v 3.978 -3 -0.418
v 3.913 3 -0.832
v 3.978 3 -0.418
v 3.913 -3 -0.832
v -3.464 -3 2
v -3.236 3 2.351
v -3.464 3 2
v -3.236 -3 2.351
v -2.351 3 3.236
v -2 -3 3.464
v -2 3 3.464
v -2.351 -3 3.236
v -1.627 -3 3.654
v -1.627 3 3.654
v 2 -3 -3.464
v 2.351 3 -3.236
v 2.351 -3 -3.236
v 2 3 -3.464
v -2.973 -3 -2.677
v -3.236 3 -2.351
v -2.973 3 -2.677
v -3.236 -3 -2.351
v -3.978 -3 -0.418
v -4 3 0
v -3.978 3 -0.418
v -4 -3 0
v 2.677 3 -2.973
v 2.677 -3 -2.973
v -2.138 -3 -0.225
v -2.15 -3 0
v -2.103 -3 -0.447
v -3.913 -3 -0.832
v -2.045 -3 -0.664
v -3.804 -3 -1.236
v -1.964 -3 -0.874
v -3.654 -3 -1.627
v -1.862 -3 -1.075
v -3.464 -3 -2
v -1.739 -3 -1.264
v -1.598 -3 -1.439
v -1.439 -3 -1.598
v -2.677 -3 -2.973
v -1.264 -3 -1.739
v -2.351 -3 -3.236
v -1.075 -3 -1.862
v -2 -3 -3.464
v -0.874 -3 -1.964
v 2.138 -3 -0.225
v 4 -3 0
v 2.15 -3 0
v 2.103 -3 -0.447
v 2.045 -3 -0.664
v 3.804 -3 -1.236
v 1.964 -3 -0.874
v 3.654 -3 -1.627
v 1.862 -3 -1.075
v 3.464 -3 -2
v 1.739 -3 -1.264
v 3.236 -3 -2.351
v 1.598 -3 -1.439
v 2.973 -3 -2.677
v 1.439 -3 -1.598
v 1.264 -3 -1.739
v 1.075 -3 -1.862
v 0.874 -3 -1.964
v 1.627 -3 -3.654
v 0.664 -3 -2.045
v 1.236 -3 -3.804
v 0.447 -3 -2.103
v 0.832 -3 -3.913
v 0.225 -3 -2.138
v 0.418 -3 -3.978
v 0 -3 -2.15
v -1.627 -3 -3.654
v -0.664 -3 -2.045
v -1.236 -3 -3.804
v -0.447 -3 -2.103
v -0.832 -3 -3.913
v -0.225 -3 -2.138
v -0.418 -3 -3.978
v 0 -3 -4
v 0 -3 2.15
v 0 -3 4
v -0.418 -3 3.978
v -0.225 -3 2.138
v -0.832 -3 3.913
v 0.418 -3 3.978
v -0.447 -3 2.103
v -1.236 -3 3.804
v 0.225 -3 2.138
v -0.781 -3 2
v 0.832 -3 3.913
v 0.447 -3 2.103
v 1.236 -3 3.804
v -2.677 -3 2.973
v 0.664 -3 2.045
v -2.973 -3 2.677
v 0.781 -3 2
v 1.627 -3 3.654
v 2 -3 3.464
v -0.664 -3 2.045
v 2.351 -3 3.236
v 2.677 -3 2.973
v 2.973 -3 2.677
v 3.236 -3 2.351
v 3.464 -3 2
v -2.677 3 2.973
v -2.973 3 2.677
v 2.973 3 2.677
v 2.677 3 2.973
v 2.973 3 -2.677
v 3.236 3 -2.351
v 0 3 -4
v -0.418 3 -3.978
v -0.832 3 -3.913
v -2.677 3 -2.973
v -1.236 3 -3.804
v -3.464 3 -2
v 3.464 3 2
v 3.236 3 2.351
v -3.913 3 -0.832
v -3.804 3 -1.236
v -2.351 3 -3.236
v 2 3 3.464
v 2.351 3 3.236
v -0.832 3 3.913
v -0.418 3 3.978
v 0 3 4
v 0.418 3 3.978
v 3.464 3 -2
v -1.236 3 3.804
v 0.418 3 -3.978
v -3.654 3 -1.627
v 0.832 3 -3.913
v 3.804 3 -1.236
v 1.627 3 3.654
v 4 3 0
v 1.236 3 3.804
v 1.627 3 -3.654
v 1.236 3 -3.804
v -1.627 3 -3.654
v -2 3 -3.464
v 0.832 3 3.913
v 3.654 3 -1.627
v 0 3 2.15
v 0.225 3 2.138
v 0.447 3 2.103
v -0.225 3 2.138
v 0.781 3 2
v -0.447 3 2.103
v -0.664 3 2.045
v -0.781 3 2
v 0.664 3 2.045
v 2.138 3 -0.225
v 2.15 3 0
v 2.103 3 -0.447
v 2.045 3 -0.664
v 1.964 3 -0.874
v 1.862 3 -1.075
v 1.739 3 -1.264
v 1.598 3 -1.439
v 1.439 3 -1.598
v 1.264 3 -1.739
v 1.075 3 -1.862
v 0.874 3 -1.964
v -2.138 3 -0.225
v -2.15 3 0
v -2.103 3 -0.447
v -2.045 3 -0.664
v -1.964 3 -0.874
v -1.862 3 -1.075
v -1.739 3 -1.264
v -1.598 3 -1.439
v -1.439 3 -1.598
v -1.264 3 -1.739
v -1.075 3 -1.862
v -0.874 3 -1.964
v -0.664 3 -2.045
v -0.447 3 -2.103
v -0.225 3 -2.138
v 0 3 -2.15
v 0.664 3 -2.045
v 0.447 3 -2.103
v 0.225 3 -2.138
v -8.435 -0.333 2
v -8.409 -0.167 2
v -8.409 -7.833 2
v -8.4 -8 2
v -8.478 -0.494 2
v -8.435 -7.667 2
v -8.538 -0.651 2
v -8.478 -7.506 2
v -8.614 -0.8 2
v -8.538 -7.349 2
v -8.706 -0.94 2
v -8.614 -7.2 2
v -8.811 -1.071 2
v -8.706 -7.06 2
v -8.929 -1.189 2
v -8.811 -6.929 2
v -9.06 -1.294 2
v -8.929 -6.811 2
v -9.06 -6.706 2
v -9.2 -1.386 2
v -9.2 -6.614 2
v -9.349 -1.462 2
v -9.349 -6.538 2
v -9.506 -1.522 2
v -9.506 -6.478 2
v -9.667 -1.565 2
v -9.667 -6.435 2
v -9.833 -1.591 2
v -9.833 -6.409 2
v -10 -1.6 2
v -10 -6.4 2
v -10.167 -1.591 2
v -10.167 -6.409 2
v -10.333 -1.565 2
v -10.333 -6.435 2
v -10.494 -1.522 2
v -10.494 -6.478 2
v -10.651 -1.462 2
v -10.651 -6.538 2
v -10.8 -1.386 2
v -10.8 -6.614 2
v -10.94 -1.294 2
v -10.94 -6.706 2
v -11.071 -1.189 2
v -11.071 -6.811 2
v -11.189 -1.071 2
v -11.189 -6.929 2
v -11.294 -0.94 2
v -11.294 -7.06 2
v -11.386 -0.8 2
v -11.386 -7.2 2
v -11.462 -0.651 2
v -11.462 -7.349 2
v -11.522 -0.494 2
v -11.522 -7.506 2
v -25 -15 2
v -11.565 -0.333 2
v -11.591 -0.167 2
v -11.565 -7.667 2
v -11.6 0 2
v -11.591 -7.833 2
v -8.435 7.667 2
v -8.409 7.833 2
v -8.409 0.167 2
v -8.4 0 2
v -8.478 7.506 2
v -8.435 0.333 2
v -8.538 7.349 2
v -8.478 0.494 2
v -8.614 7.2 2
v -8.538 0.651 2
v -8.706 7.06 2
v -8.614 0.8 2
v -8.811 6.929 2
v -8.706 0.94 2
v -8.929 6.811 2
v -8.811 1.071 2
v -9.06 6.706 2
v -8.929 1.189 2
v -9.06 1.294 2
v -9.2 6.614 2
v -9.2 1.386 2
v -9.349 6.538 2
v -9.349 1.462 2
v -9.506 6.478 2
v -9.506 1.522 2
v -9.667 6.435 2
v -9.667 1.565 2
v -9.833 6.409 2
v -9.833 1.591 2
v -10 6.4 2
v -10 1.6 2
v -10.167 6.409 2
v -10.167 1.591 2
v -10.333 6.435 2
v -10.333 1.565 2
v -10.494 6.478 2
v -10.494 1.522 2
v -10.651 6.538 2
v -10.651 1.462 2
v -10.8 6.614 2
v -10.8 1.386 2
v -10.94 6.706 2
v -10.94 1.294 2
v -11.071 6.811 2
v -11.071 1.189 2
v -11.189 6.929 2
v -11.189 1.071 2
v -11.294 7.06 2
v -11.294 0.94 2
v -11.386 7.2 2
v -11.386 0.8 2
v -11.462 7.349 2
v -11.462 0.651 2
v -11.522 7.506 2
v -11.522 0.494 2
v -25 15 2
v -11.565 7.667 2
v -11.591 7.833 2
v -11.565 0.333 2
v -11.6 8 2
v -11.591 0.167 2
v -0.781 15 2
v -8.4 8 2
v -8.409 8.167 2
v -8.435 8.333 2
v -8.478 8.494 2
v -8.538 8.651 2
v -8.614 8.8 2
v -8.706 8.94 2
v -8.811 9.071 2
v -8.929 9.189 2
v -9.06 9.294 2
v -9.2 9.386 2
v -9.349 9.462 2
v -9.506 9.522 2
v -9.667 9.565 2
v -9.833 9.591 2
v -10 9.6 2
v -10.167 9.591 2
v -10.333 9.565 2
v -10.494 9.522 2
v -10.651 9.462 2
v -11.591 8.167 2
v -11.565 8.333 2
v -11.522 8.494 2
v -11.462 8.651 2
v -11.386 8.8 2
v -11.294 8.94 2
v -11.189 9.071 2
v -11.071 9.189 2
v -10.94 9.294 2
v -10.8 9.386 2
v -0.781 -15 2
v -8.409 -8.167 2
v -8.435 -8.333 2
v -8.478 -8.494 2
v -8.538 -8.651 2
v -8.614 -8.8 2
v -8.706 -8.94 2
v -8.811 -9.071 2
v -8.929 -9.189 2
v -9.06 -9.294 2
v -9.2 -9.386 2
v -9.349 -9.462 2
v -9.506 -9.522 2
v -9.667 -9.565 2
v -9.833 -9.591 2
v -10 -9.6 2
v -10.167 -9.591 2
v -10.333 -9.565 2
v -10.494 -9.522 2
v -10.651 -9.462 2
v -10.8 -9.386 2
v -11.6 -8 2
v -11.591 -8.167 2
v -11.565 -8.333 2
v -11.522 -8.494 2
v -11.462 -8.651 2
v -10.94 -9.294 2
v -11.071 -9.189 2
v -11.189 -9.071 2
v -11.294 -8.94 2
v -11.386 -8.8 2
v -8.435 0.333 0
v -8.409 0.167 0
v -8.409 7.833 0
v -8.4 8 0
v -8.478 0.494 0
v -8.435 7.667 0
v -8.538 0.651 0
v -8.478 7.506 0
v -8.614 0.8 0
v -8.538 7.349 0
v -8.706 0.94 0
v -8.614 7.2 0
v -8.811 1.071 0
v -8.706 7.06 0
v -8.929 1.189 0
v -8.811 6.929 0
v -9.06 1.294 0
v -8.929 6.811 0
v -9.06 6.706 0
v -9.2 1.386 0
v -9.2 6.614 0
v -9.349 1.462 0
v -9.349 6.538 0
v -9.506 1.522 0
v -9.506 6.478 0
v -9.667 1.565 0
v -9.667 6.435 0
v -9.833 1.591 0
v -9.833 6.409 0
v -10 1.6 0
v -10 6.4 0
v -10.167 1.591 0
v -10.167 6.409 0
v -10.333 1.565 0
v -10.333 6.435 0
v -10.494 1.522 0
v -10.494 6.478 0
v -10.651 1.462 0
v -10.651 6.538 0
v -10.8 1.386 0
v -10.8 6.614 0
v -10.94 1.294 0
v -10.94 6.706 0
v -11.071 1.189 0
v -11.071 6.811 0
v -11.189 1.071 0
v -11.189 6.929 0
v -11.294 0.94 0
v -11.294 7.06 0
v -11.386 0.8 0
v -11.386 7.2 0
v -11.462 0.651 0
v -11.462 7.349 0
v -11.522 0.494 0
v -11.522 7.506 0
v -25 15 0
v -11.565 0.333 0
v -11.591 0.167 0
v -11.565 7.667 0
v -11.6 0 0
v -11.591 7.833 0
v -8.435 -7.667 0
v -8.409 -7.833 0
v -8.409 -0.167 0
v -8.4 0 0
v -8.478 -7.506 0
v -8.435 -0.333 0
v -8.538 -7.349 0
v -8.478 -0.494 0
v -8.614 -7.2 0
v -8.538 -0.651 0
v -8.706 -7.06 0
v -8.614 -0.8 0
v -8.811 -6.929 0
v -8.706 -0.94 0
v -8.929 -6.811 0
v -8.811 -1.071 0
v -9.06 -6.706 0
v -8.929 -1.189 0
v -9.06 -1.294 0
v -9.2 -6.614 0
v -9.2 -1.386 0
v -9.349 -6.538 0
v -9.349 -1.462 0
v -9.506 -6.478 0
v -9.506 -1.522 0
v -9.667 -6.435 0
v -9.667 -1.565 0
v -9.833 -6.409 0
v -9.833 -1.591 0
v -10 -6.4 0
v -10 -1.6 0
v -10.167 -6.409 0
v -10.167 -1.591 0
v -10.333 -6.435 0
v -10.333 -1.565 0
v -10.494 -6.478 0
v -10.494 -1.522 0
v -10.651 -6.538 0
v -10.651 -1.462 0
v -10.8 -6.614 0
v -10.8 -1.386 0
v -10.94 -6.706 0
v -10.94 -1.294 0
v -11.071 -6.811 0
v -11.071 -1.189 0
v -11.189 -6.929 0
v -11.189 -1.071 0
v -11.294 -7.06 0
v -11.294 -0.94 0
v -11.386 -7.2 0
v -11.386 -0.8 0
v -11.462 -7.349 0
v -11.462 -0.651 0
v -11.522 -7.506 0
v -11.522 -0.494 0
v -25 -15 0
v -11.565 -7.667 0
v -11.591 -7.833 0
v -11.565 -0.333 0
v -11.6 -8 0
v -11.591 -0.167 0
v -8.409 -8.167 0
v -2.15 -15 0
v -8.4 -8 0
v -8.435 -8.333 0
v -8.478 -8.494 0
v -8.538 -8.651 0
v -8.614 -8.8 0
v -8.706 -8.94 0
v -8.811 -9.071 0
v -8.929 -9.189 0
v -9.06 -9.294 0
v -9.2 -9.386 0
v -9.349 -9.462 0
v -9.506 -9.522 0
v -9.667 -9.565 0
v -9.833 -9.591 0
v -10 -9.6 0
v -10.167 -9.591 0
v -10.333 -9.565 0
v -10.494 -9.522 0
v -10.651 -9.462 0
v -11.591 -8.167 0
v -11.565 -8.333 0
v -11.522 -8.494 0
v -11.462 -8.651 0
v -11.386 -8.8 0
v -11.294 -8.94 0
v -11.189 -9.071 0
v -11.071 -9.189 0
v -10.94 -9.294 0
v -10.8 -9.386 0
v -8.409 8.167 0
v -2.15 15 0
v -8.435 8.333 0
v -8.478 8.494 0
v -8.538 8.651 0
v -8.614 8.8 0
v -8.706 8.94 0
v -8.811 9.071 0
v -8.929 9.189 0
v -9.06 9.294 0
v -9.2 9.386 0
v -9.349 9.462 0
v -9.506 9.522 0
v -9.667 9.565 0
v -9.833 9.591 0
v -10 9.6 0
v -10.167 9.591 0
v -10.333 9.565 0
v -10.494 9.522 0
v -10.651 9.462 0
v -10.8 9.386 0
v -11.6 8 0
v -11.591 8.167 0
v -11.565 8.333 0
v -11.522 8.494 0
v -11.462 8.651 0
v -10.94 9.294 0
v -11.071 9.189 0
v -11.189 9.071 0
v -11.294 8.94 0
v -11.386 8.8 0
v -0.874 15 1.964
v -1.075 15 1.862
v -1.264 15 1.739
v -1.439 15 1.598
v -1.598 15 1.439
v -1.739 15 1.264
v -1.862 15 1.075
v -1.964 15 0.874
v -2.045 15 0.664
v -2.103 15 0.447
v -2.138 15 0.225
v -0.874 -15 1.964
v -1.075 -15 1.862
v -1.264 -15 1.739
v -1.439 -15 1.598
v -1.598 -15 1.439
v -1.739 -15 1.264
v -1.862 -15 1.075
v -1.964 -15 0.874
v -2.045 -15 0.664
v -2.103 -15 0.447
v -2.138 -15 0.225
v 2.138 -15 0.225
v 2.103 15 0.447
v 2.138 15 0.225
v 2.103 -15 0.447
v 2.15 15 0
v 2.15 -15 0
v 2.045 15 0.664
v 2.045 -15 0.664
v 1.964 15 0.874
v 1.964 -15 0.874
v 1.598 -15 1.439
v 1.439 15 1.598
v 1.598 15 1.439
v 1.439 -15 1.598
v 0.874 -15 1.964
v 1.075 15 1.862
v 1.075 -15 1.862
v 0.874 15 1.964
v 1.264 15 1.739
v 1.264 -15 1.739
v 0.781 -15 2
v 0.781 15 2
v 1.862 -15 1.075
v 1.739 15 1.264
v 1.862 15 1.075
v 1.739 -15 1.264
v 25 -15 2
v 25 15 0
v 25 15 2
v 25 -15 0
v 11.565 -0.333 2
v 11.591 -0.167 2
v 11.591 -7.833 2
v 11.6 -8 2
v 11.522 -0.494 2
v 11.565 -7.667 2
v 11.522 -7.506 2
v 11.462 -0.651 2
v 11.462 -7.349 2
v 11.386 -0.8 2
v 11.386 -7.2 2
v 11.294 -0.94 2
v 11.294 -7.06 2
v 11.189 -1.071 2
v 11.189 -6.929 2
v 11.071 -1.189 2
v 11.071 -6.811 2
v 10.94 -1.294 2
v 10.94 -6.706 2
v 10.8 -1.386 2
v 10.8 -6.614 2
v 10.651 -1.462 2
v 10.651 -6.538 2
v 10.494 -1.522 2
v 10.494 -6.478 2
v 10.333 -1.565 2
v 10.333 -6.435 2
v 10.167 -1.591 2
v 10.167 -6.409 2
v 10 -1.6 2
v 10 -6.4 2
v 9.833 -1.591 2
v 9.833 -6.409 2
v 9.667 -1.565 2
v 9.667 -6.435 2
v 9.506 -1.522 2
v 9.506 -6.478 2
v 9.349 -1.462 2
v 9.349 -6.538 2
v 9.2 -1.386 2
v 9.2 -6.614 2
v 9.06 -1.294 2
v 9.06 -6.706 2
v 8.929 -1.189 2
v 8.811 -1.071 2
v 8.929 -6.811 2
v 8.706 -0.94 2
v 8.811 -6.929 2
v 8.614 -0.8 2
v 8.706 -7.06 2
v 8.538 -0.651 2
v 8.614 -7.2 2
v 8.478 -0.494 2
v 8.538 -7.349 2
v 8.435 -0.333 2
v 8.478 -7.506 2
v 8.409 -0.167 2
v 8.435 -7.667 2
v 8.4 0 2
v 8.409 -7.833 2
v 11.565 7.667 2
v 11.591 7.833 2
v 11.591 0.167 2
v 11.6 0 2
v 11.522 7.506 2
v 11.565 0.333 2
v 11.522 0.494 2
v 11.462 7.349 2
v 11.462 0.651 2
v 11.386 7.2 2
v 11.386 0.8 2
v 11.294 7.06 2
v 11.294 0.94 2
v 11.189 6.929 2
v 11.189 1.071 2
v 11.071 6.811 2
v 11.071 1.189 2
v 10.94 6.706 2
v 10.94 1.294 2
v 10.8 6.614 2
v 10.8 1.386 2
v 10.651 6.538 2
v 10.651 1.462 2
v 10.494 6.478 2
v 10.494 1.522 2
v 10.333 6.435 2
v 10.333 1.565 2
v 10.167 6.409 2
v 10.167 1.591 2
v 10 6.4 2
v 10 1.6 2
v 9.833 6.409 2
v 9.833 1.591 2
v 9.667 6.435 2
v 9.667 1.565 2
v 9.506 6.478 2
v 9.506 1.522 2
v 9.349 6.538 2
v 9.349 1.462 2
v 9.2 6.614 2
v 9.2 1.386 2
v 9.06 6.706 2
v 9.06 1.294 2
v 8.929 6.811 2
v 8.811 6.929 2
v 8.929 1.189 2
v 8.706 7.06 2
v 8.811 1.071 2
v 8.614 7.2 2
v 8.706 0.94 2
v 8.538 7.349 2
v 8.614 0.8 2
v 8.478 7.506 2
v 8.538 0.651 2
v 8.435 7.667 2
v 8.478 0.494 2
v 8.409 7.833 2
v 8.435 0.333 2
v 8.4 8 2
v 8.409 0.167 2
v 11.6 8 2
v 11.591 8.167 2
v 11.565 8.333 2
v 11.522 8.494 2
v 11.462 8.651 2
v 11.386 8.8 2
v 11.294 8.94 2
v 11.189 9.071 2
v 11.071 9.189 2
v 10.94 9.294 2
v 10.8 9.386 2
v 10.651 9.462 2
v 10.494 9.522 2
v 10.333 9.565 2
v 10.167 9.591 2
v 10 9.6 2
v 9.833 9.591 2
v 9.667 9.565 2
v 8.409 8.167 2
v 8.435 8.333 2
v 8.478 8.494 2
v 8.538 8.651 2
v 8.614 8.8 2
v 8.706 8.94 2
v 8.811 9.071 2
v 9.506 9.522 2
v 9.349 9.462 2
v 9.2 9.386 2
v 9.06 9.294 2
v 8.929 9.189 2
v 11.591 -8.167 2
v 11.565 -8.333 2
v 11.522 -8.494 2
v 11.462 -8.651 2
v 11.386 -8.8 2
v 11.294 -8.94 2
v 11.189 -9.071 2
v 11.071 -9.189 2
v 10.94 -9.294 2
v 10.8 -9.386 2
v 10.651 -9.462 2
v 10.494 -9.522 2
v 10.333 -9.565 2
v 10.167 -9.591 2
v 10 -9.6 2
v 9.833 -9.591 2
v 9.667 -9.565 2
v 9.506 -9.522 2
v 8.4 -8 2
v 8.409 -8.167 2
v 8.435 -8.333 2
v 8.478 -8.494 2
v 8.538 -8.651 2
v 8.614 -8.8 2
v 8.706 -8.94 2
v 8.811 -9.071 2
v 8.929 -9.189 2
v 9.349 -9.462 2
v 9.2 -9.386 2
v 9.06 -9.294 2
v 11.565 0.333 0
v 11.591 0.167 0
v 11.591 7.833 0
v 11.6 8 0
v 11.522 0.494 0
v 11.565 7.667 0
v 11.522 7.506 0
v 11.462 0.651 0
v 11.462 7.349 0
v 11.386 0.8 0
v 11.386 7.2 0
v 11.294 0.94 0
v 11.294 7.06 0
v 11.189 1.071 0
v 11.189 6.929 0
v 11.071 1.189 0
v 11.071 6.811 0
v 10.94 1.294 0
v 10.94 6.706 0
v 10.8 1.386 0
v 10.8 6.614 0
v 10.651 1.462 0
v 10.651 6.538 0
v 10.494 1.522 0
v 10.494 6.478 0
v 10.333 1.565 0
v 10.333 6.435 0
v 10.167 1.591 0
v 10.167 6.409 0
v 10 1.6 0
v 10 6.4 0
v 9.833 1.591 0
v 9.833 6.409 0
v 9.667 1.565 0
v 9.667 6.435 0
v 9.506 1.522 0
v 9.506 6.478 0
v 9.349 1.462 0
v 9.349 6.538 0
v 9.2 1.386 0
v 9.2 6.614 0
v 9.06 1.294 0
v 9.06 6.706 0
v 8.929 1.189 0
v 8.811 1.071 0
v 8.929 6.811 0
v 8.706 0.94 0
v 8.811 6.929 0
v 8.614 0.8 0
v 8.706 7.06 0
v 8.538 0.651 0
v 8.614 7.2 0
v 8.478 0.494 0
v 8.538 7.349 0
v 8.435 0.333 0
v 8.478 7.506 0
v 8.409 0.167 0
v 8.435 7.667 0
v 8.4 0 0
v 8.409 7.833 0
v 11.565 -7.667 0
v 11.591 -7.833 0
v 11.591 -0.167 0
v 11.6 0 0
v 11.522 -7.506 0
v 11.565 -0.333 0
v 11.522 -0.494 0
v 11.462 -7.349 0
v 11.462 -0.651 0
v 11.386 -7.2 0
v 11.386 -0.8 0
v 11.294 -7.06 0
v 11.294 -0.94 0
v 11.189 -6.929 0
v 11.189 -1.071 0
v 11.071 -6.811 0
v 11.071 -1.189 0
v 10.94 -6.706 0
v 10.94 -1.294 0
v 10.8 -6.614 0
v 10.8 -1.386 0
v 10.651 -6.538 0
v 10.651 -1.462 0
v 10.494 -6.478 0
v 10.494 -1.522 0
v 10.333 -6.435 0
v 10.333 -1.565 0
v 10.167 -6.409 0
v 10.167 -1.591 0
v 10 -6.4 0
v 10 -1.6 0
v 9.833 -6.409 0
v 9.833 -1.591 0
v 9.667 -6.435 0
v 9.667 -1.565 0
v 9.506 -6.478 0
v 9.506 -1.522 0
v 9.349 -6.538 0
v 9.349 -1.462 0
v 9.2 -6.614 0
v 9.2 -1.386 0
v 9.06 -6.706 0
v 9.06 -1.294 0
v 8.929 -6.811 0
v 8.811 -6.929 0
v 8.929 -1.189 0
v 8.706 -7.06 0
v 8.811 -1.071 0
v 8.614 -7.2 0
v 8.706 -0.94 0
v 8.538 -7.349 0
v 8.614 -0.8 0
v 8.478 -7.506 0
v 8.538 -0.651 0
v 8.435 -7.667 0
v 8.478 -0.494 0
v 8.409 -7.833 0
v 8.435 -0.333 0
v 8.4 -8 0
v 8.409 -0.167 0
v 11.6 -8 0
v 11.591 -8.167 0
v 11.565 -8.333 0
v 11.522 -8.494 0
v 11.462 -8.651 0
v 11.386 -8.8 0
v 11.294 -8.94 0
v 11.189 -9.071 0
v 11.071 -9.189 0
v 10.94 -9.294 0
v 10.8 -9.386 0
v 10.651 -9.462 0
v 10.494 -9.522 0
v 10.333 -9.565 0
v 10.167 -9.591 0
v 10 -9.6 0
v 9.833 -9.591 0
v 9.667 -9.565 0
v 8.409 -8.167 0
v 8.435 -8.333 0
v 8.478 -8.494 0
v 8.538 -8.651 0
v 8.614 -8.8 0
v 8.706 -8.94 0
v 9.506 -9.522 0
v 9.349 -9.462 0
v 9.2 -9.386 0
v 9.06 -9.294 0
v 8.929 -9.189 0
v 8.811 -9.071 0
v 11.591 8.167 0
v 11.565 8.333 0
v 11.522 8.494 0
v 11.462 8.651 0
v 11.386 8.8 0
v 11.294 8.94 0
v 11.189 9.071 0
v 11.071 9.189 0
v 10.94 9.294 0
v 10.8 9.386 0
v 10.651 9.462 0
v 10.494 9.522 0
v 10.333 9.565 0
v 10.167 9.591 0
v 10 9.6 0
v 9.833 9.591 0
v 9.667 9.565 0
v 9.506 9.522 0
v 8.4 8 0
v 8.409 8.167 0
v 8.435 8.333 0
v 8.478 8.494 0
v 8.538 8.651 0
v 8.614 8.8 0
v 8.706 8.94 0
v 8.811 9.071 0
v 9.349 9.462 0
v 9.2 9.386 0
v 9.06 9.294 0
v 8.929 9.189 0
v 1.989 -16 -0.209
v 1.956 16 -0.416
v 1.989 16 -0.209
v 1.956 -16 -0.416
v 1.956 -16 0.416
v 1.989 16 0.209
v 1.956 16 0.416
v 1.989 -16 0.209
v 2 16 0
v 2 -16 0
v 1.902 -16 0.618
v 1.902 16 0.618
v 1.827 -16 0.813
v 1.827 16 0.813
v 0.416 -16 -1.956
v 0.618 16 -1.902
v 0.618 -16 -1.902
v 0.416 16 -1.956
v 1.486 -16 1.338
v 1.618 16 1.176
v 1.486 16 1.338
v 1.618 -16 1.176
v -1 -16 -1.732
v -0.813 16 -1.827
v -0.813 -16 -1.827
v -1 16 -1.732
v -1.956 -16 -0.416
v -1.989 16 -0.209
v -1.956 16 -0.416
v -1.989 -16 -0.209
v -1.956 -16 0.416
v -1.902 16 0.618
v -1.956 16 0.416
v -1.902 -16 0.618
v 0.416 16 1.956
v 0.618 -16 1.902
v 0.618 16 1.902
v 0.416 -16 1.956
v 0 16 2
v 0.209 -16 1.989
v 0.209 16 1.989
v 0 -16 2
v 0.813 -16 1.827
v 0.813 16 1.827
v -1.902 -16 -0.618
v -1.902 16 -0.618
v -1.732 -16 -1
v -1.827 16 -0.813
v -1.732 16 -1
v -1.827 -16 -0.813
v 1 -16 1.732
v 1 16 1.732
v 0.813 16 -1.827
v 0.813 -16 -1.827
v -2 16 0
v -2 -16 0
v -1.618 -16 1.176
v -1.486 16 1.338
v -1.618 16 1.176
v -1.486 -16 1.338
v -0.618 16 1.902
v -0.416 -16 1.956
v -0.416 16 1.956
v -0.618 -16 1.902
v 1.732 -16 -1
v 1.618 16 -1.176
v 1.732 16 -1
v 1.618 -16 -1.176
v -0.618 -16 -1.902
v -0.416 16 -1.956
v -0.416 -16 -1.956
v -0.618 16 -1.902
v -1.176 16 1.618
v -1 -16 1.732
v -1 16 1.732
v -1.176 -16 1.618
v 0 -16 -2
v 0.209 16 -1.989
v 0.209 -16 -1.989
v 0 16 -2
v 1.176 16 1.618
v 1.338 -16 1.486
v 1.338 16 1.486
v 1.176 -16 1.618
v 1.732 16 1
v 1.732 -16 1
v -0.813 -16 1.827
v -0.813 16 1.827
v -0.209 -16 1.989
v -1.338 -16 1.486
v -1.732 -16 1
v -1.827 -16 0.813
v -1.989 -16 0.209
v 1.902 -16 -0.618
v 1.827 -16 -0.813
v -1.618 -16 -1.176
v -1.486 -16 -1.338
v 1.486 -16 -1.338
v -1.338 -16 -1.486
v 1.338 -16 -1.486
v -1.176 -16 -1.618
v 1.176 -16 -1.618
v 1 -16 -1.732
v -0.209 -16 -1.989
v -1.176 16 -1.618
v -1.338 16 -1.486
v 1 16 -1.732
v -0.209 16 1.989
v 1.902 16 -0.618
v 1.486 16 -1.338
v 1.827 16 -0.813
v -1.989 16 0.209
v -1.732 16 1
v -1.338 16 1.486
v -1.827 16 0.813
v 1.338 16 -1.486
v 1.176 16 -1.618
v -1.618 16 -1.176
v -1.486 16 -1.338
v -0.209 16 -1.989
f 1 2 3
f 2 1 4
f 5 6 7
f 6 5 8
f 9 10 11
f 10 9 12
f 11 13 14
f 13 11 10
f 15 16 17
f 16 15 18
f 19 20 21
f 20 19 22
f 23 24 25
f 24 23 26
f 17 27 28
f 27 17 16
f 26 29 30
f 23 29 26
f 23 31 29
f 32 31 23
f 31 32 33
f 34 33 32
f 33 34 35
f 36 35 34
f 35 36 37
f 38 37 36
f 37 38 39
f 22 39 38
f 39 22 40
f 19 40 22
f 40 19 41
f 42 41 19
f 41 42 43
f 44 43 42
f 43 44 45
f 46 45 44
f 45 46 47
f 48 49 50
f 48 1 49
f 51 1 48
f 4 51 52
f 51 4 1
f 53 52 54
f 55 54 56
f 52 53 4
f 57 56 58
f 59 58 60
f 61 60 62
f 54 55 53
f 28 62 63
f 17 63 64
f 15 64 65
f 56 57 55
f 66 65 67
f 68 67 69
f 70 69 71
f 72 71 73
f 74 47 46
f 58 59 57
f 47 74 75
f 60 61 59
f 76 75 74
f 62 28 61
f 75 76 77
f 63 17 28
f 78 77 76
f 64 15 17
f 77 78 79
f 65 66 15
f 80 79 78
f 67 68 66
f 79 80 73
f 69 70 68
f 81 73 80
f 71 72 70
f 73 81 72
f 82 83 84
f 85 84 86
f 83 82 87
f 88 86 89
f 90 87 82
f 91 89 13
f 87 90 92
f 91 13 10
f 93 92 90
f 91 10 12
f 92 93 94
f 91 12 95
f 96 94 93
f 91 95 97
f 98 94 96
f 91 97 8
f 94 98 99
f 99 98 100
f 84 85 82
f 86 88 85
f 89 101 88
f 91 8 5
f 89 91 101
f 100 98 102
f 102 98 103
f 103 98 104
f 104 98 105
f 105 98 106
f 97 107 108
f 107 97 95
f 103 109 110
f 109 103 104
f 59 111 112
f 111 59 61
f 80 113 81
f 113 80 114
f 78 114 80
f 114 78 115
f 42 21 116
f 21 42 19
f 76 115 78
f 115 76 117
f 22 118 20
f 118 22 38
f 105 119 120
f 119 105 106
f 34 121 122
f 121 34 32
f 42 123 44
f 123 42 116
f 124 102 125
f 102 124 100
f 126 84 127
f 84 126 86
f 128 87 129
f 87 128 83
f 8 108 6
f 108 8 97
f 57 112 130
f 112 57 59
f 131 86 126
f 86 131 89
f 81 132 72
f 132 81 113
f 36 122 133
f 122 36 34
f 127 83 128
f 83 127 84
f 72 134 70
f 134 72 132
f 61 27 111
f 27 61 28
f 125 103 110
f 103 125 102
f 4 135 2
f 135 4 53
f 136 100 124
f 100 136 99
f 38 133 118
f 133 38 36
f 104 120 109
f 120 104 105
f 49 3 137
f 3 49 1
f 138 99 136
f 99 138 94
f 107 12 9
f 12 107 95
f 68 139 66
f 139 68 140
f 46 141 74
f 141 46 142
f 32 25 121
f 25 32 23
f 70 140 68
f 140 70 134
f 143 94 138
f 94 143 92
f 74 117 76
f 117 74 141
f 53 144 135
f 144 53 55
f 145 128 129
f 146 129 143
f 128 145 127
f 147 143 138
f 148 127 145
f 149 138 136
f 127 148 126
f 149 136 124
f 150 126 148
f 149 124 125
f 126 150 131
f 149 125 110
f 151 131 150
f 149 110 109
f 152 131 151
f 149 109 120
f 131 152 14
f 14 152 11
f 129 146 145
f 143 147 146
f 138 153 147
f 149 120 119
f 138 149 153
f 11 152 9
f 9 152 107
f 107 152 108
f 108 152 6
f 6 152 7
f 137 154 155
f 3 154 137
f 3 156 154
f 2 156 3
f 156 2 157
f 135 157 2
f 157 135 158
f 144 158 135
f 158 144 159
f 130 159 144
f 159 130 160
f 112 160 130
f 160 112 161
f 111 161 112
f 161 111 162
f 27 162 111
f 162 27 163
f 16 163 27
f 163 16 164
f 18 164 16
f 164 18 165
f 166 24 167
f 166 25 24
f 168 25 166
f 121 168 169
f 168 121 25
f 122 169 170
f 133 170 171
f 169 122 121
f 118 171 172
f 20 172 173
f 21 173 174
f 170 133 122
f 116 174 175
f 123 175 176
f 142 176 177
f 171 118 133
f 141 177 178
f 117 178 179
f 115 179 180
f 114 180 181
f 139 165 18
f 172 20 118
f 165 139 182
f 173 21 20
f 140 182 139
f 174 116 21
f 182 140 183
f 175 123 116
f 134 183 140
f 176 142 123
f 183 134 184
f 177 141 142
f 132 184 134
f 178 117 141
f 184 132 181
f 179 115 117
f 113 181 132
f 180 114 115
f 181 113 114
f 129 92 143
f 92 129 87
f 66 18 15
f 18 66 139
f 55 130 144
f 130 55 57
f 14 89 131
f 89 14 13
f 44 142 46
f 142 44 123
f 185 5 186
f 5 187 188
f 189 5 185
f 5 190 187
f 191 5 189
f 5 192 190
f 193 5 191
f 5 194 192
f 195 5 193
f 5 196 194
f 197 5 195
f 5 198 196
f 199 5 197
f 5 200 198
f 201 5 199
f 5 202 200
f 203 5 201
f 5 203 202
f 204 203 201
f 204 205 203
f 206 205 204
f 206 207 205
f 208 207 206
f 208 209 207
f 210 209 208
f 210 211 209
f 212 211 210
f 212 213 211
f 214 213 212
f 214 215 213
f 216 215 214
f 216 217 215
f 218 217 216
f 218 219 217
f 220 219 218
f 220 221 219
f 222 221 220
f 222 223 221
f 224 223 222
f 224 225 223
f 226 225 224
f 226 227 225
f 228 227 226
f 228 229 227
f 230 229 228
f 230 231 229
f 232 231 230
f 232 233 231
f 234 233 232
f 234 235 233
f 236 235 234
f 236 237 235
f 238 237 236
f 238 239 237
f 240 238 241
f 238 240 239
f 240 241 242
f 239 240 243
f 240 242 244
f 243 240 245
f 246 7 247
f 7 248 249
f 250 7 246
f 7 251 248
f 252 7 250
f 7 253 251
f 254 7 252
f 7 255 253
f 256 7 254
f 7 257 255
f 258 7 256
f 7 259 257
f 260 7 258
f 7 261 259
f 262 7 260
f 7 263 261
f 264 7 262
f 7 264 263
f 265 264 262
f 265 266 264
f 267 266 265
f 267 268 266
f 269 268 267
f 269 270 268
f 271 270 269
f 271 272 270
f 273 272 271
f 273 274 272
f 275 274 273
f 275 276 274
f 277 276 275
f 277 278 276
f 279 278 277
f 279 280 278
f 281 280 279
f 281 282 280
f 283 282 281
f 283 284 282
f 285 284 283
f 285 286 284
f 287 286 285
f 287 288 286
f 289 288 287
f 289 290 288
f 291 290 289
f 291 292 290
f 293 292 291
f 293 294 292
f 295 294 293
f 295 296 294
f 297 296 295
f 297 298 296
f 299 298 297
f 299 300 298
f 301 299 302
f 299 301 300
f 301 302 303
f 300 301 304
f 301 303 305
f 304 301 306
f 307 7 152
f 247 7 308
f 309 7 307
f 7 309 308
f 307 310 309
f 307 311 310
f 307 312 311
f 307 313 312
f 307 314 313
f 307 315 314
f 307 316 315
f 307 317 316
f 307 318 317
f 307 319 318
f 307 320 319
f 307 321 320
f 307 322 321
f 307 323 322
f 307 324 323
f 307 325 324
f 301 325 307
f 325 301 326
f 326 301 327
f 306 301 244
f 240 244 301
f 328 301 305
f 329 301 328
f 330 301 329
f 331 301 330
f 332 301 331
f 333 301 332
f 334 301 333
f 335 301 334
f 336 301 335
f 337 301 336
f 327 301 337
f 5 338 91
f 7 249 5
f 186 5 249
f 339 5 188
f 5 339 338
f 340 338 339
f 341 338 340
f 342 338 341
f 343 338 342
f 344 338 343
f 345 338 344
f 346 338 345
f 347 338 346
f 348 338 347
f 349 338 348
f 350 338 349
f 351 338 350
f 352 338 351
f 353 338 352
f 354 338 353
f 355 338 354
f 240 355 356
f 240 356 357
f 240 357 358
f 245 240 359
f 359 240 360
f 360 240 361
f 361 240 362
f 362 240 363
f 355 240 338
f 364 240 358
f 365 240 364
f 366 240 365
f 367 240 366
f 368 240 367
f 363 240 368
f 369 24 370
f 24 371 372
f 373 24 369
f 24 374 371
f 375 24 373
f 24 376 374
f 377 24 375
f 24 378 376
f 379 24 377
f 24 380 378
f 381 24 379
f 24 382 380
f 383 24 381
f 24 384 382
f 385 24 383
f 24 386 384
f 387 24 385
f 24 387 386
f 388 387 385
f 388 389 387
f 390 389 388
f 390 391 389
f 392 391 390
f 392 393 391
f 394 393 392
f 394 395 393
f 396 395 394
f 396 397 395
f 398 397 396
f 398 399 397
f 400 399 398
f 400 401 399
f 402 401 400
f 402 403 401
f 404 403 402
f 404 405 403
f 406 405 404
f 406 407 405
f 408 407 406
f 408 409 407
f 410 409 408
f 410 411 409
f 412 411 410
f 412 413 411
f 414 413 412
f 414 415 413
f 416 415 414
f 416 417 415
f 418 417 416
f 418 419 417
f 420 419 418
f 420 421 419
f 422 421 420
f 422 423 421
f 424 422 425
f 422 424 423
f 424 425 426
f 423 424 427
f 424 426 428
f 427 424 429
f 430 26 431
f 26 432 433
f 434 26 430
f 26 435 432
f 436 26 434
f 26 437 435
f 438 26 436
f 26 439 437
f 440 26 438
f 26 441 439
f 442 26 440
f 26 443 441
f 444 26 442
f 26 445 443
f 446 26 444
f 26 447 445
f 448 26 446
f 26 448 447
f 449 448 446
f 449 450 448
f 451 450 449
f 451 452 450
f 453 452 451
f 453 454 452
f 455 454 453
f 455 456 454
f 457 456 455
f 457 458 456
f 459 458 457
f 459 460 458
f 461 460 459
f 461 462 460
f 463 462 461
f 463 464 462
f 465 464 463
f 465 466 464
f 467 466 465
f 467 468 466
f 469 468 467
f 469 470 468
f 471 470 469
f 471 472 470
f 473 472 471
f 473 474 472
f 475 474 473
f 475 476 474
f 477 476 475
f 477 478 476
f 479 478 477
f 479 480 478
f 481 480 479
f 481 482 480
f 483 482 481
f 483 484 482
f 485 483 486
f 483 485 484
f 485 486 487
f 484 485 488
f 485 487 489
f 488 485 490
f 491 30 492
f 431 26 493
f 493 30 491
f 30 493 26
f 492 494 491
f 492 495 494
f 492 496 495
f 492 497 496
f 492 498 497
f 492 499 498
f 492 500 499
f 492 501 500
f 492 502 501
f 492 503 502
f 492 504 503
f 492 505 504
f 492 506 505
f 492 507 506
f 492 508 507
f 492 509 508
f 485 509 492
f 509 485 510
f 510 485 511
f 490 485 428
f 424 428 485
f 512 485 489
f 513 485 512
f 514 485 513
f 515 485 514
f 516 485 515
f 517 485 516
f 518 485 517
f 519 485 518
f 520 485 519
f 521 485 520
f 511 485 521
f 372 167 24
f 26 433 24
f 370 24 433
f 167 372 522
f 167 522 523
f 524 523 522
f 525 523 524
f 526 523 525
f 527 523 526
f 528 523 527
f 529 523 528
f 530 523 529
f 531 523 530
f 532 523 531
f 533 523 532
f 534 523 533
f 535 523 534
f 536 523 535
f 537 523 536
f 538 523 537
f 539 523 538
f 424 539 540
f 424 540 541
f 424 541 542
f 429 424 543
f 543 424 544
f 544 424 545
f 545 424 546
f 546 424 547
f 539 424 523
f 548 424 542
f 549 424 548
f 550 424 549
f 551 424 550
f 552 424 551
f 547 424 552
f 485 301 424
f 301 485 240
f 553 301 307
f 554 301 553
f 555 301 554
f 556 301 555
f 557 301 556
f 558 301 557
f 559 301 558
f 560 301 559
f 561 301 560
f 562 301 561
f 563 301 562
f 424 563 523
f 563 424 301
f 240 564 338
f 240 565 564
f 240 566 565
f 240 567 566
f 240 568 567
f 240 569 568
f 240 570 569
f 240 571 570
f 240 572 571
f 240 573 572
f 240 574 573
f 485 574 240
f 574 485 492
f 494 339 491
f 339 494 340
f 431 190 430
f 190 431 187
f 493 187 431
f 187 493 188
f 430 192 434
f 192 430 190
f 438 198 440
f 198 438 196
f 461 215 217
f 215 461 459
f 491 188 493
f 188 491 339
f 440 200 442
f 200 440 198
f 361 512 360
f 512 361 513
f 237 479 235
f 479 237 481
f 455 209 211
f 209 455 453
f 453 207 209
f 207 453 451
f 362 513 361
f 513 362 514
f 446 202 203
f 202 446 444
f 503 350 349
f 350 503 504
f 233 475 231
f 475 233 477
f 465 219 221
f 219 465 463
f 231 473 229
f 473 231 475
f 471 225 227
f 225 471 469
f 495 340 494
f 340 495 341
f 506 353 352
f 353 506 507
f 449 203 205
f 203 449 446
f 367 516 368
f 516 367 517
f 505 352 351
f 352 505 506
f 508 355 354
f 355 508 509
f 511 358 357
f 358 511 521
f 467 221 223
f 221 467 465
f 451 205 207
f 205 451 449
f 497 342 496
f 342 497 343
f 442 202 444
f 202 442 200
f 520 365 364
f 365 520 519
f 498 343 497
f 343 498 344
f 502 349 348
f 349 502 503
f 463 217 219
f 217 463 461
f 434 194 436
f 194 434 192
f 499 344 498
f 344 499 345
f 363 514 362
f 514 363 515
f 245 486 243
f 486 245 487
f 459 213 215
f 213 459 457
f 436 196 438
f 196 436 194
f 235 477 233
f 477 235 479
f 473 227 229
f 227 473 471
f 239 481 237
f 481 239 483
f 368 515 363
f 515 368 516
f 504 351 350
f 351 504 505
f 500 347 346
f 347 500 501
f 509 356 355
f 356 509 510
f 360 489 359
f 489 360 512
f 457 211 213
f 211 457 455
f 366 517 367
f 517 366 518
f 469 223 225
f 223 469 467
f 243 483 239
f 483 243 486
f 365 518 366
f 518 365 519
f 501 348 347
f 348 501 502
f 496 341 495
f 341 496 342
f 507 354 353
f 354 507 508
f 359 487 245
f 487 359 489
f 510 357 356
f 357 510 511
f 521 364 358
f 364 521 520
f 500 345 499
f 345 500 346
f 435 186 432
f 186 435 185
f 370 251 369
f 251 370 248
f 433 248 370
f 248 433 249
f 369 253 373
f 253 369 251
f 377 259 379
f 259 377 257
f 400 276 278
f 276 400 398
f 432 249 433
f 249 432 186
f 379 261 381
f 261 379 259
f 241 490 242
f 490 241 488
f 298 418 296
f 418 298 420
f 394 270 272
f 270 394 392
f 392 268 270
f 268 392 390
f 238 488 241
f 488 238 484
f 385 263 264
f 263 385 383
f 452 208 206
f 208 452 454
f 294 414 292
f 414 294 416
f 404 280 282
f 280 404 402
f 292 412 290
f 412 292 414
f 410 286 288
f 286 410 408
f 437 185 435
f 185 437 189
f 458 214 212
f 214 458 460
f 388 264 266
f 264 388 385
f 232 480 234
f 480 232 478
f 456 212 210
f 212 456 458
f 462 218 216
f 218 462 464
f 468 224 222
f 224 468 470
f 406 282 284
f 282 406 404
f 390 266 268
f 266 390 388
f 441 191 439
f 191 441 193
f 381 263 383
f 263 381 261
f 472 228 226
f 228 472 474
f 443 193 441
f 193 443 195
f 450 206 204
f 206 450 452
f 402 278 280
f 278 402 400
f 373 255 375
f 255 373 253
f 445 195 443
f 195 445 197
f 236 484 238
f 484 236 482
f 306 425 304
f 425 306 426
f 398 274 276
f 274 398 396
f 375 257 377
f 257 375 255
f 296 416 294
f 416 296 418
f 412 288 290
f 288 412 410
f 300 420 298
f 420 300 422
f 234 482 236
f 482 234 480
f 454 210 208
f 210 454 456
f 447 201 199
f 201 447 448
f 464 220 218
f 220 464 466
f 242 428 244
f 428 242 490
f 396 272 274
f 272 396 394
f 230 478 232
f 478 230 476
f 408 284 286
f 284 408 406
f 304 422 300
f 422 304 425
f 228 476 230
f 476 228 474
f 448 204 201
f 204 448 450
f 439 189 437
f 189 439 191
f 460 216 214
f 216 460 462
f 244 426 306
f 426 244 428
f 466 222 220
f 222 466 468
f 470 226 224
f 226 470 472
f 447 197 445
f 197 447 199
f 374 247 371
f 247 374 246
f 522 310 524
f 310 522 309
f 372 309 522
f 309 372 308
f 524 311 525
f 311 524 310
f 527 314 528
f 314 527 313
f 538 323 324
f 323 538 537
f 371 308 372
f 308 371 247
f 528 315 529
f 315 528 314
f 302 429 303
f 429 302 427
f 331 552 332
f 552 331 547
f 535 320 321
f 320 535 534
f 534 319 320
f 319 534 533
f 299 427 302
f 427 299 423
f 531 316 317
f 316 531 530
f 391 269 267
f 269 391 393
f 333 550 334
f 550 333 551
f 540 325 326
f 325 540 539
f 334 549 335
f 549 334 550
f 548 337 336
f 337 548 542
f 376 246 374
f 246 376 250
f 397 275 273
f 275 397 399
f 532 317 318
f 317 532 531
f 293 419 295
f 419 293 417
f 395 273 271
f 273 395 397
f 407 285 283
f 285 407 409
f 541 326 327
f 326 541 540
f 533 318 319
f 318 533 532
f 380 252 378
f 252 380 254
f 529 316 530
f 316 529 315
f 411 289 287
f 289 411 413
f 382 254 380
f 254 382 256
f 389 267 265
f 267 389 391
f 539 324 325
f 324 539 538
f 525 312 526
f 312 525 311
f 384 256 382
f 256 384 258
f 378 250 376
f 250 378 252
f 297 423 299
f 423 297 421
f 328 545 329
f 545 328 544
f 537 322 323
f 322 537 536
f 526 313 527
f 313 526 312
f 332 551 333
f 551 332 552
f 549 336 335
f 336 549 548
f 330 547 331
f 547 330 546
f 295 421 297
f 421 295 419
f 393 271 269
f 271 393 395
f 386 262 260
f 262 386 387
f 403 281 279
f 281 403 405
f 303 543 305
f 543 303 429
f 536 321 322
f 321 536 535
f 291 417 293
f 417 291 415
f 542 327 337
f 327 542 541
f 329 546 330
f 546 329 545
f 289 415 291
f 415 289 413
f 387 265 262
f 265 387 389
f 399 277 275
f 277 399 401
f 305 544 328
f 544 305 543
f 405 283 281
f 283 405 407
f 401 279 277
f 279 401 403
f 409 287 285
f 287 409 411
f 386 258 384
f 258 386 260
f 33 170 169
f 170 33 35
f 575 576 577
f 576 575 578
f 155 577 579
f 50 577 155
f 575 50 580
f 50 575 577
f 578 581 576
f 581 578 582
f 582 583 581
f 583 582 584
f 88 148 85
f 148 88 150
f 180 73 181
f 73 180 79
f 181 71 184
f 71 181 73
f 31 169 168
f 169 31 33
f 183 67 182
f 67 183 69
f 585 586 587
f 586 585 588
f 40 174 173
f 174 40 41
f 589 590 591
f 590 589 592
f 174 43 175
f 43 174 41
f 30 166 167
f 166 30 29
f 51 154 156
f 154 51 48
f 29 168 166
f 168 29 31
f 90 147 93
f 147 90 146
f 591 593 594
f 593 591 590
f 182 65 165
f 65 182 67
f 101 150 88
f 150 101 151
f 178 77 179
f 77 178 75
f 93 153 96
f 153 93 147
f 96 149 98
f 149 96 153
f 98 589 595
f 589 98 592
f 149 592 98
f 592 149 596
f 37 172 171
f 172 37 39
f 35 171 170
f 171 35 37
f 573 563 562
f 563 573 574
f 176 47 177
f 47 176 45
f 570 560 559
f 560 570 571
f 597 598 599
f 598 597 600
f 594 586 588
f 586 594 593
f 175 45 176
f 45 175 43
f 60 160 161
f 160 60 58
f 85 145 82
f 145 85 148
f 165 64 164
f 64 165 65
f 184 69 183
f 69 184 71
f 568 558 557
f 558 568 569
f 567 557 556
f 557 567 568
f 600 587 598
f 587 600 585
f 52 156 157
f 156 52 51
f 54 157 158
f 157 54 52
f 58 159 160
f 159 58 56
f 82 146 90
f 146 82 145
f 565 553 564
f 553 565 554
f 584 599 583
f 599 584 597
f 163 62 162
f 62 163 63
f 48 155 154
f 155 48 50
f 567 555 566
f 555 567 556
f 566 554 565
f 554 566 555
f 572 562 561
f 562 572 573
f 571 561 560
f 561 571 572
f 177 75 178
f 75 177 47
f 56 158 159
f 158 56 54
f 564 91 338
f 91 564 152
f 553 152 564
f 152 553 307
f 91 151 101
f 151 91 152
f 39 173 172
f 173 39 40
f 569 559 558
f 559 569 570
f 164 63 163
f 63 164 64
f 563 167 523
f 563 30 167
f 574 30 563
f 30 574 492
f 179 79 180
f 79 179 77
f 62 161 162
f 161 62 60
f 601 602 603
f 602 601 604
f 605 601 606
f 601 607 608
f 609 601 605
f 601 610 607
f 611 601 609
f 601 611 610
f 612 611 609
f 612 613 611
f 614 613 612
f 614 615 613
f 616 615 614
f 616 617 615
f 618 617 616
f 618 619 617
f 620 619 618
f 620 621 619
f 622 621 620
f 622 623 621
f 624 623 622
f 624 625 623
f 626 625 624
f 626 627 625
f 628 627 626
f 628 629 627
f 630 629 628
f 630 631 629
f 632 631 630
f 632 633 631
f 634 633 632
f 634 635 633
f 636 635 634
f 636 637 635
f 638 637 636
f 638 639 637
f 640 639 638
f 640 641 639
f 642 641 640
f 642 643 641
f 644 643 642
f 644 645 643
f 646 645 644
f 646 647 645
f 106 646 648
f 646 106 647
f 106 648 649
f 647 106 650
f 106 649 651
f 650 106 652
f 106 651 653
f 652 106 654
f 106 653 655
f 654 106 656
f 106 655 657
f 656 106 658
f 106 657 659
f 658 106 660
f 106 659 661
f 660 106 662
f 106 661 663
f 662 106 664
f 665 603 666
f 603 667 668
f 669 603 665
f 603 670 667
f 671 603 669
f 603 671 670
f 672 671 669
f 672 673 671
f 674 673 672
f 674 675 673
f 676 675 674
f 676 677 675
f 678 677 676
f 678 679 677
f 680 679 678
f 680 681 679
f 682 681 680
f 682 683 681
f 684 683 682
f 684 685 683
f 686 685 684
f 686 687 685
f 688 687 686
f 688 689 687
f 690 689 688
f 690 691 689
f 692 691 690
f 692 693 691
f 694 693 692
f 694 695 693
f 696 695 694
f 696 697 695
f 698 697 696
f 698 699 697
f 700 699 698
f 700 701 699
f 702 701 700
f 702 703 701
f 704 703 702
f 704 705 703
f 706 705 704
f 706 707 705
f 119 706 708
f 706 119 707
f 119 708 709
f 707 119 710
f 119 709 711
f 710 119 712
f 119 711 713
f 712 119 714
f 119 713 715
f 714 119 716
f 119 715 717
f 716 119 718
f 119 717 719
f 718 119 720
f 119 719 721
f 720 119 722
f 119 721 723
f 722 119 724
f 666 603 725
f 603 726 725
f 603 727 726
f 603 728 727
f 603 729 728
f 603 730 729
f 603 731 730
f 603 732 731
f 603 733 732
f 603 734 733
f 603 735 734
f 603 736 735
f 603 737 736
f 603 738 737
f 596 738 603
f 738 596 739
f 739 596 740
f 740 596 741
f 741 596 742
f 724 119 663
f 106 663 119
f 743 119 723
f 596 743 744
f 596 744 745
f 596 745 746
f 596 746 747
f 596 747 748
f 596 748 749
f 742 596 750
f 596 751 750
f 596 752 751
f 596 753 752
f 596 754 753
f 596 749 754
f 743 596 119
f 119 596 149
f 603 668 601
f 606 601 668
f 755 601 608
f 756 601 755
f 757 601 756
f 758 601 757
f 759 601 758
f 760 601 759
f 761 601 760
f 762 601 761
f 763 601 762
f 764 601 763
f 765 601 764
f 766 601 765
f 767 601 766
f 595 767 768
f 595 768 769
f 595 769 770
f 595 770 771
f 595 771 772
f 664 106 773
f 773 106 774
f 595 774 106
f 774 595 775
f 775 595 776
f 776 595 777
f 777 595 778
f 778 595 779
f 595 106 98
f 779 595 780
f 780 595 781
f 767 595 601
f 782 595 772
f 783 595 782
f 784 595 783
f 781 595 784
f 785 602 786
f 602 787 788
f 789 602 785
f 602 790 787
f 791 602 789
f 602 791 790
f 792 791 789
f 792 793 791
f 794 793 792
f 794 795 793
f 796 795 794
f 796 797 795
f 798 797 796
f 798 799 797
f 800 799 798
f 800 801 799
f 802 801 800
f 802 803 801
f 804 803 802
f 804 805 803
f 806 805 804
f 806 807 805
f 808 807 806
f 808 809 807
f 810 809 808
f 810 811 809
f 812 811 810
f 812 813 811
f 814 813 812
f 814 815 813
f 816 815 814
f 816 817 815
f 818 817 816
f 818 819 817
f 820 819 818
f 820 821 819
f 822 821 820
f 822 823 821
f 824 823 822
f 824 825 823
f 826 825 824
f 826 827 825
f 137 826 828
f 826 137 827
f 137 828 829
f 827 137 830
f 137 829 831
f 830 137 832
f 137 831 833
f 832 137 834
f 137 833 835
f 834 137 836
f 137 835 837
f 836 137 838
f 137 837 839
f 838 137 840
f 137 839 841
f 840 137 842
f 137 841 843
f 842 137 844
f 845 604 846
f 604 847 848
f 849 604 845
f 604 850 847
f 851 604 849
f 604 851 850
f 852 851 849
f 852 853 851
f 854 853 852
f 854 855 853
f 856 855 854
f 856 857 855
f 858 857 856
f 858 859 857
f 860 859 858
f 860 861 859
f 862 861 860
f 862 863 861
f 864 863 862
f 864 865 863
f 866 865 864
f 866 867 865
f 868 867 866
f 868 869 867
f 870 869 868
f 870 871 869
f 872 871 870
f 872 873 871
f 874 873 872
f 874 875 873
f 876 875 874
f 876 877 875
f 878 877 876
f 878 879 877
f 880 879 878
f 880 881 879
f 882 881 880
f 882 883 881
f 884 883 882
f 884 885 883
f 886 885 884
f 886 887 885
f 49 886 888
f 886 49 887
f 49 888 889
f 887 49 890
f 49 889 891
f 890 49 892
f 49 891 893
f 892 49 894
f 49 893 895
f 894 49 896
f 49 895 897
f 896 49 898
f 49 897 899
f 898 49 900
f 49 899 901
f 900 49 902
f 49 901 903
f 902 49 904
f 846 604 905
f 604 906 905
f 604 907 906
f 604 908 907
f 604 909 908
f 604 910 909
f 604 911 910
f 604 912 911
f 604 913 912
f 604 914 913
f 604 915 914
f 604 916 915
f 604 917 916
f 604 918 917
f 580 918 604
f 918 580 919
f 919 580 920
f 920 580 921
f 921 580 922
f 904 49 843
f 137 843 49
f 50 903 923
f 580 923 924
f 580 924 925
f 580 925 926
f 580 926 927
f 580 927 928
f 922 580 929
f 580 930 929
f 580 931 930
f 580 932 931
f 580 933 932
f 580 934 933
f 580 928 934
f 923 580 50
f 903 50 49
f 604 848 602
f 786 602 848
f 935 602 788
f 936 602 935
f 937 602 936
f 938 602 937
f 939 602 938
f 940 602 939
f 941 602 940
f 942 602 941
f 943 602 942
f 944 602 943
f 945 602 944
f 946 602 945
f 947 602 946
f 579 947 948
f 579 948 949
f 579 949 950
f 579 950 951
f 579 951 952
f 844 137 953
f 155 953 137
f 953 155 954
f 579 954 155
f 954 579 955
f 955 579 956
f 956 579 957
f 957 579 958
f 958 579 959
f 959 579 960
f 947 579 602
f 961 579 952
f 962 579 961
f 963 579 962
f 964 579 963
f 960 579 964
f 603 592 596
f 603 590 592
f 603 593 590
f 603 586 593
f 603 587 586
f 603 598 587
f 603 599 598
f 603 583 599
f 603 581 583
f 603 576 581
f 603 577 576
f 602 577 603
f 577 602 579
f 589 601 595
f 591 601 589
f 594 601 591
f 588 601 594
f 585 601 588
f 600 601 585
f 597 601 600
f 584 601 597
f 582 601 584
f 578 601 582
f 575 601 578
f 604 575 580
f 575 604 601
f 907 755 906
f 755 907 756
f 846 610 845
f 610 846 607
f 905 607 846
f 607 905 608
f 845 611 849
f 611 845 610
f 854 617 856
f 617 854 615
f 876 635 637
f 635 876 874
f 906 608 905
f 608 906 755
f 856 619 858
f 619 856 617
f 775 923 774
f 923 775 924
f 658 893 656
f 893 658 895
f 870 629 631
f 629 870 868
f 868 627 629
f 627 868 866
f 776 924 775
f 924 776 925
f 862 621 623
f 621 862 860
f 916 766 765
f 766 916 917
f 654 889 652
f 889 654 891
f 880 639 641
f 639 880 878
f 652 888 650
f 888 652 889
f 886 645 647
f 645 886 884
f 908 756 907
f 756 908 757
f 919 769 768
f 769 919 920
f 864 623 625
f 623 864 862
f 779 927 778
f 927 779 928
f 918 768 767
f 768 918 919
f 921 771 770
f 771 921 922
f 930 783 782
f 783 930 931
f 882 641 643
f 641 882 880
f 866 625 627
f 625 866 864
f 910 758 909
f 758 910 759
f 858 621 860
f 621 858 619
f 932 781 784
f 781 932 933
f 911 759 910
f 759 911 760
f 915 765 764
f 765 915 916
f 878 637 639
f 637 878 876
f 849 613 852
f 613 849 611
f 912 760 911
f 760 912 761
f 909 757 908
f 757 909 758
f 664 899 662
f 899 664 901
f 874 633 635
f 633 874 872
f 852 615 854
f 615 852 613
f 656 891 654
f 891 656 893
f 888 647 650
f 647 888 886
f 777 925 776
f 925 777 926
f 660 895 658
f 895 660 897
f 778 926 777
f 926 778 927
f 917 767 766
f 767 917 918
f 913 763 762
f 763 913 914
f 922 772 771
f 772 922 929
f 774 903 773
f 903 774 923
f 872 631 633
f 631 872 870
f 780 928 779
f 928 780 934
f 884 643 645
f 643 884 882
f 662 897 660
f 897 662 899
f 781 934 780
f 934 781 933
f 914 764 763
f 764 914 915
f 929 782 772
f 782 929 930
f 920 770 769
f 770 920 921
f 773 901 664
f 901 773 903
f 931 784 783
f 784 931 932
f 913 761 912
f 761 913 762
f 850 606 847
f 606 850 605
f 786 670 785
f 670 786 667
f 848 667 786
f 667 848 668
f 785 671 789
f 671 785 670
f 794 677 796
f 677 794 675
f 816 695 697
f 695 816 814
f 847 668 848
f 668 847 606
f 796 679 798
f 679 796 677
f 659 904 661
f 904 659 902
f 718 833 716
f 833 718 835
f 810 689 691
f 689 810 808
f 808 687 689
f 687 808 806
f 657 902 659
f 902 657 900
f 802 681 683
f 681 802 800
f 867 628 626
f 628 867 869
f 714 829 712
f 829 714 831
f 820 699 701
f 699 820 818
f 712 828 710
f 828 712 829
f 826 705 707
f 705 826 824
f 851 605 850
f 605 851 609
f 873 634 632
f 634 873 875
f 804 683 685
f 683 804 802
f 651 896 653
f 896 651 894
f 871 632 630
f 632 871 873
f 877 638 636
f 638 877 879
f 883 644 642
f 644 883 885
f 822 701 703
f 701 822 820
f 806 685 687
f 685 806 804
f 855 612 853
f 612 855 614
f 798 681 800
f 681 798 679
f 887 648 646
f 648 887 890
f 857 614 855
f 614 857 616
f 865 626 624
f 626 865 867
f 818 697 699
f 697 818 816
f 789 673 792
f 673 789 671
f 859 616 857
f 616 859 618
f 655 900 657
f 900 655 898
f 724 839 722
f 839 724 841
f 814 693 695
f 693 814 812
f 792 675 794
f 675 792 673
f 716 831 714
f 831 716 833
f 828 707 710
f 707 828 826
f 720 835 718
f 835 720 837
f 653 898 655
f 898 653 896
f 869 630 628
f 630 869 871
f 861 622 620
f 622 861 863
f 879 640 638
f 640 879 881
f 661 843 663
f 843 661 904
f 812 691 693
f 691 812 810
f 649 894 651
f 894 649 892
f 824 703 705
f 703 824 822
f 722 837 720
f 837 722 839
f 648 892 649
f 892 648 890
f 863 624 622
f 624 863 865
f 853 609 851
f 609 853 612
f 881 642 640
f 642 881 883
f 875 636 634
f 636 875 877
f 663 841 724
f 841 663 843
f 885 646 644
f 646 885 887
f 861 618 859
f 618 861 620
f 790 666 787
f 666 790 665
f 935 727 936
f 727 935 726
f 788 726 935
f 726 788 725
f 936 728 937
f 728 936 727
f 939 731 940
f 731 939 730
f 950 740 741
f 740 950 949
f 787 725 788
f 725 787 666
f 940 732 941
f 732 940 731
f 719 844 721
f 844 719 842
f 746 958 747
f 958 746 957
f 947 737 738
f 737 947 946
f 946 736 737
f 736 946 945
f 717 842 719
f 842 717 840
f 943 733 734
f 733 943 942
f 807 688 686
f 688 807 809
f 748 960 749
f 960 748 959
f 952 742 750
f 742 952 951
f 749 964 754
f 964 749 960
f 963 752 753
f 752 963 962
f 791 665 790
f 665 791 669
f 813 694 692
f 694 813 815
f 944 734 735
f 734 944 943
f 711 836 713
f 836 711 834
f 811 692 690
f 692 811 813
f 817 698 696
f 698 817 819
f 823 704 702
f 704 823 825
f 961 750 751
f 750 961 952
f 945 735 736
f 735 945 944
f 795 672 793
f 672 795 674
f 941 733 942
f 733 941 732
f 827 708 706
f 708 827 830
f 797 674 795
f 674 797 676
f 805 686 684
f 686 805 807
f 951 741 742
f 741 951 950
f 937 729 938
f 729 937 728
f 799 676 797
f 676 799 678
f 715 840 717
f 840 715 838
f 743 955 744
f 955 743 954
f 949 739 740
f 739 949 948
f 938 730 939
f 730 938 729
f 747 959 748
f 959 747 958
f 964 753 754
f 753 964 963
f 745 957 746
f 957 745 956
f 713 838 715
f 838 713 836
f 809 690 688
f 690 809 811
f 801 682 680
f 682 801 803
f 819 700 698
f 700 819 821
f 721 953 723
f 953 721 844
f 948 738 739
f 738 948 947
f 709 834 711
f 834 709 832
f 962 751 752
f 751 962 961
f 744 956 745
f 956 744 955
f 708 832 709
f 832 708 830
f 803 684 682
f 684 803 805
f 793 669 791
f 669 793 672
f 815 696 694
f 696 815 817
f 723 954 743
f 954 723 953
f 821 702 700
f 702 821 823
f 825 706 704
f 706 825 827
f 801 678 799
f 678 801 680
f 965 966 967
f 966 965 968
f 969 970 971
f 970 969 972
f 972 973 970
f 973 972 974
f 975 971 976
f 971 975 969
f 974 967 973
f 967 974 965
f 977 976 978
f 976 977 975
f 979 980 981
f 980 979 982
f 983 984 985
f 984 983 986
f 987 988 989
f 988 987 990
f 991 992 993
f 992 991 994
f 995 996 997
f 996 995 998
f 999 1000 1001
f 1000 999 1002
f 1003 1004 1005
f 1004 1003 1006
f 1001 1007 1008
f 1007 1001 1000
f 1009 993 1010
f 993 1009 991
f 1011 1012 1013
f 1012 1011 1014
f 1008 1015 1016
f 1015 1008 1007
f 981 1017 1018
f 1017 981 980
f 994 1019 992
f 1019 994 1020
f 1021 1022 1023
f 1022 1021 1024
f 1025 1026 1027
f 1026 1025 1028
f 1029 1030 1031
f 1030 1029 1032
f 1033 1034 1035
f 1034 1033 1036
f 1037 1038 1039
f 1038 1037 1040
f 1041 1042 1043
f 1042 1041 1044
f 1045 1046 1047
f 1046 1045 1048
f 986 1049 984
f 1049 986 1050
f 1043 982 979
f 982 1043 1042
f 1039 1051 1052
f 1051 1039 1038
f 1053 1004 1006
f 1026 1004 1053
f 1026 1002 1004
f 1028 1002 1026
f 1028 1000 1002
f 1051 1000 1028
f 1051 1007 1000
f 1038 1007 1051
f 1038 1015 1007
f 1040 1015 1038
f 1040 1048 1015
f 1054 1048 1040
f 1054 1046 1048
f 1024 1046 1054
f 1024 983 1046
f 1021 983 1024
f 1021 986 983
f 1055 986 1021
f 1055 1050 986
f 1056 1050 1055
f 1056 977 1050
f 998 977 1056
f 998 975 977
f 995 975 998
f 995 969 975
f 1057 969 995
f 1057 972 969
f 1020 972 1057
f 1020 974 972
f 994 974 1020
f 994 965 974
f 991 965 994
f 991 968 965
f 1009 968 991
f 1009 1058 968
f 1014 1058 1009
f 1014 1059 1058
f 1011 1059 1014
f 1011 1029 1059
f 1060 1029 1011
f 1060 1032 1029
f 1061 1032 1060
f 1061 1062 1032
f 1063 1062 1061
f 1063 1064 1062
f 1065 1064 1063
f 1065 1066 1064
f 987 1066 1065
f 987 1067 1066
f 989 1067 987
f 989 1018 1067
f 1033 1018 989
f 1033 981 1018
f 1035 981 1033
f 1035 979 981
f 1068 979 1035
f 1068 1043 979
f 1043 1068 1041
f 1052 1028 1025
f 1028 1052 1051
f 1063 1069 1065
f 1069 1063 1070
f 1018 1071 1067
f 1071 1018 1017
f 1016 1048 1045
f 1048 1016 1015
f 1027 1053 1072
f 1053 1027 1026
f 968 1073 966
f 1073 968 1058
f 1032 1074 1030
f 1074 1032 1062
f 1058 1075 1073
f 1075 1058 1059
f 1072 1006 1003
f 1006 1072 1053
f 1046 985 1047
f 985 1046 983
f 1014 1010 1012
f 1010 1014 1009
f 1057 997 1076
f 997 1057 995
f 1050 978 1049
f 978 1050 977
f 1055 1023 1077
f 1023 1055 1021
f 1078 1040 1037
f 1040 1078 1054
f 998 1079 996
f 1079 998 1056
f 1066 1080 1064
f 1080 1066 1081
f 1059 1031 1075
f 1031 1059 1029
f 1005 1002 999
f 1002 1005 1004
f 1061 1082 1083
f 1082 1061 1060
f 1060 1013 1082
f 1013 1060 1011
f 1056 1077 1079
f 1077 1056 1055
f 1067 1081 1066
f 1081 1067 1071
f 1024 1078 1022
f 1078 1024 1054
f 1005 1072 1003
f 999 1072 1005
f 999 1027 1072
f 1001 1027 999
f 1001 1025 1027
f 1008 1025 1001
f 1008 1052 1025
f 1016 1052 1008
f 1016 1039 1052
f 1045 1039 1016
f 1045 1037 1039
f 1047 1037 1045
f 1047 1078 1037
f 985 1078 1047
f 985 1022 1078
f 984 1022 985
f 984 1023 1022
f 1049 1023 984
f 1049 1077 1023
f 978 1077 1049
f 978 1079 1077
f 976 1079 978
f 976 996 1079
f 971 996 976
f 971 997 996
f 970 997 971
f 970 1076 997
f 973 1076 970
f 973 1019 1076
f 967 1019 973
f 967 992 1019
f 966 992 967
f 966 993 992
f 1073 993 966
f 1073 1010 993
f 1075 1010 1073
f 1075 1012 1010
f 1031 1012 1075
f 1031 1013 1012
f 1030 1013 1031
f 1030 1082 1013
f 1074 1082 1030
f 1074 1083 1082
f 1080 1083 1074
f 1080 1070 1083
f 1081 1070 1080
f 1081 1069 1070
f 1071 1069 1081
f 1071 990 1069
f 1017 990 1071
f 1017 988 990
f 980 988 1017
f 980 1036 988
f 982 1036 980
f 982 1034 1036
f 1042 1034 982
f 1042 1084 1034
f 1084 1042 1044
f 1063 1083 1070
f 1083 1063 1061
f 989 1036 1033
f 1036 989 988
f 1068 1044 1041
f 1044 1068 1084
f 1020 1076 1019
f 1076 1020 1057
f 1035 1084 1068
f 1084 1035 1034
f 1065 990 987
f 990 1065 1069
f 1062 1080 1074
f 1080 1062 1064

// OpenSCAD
// Parameters
leaf_w = 25;
leaf_h = 30;
leaf_t = 2;
knuckle_outer_d = 8;
knuckle_inner_d = 4.3;
pin_d = 4;
pin_l = 32;
knuckle_count = 5;
knuckle_len = leaf_h / knuckle_count; // 6mm
hole_dist = 8;

module hinge() {
    // Left Leaf (x < 0)
    difference() {
        union() {
            translate([-leaf_w, -leaf_h/2, 0]) cube([leaf_w, leaf_h, leaf_t]);
            for (i = [0:2:4]) {
                rotate([90, 0, 0]) cylinder(d = knuckle_outer_d, h = knuckle_len, center = true);
            }
        }
        // Pin hole
        rotate([90, 0, 0]) cylinder(d = knuckle_inner_d, h = leaf_h + 2, center = true);
        // Countersunk holes
        for (i = [-1, 0, 1]) {
            translate([-10, i * hole_dist, -1]) {
                cylinder(d1 = 6, d2 = 3.2, h = 1);
                cylinder(d = 3.2, h = leaf_t + 2);
            }
        }
    }

    // Right Leaf (x > 0)
    difference() {
        union() {
            translate([0, -leaf_h/2, 0]) cube([leaf_w, leaf_h, leaf_t]);
            for (i = [1:2:3]) {
                rotate([90, 0, 0]) cylinder(d = knuckle_outer_d, h = knuckle_len, center = true);
            }
        }
        // Pin hole
        rotate([90, 0, 0]) cylinder(d = knuckle_inner_d, h = leaf_h + 2, center = true);
        // Countersunk holes
        for (i = [-1, 0, 1]) {
            translate([10, i * hole_dist, -1]) {
                cylinder(d1 = 6, d2 = 3.2, h = 1);
                cylinder(d = 3.2, h = leaf_t + 2);
            }
        }
    }

    // Pin
    rotate([90, 0, 0]) color("silver") cylinder(d = pin_d, h = pin_l, center = true);
}

$fn = 60;
hinge();
